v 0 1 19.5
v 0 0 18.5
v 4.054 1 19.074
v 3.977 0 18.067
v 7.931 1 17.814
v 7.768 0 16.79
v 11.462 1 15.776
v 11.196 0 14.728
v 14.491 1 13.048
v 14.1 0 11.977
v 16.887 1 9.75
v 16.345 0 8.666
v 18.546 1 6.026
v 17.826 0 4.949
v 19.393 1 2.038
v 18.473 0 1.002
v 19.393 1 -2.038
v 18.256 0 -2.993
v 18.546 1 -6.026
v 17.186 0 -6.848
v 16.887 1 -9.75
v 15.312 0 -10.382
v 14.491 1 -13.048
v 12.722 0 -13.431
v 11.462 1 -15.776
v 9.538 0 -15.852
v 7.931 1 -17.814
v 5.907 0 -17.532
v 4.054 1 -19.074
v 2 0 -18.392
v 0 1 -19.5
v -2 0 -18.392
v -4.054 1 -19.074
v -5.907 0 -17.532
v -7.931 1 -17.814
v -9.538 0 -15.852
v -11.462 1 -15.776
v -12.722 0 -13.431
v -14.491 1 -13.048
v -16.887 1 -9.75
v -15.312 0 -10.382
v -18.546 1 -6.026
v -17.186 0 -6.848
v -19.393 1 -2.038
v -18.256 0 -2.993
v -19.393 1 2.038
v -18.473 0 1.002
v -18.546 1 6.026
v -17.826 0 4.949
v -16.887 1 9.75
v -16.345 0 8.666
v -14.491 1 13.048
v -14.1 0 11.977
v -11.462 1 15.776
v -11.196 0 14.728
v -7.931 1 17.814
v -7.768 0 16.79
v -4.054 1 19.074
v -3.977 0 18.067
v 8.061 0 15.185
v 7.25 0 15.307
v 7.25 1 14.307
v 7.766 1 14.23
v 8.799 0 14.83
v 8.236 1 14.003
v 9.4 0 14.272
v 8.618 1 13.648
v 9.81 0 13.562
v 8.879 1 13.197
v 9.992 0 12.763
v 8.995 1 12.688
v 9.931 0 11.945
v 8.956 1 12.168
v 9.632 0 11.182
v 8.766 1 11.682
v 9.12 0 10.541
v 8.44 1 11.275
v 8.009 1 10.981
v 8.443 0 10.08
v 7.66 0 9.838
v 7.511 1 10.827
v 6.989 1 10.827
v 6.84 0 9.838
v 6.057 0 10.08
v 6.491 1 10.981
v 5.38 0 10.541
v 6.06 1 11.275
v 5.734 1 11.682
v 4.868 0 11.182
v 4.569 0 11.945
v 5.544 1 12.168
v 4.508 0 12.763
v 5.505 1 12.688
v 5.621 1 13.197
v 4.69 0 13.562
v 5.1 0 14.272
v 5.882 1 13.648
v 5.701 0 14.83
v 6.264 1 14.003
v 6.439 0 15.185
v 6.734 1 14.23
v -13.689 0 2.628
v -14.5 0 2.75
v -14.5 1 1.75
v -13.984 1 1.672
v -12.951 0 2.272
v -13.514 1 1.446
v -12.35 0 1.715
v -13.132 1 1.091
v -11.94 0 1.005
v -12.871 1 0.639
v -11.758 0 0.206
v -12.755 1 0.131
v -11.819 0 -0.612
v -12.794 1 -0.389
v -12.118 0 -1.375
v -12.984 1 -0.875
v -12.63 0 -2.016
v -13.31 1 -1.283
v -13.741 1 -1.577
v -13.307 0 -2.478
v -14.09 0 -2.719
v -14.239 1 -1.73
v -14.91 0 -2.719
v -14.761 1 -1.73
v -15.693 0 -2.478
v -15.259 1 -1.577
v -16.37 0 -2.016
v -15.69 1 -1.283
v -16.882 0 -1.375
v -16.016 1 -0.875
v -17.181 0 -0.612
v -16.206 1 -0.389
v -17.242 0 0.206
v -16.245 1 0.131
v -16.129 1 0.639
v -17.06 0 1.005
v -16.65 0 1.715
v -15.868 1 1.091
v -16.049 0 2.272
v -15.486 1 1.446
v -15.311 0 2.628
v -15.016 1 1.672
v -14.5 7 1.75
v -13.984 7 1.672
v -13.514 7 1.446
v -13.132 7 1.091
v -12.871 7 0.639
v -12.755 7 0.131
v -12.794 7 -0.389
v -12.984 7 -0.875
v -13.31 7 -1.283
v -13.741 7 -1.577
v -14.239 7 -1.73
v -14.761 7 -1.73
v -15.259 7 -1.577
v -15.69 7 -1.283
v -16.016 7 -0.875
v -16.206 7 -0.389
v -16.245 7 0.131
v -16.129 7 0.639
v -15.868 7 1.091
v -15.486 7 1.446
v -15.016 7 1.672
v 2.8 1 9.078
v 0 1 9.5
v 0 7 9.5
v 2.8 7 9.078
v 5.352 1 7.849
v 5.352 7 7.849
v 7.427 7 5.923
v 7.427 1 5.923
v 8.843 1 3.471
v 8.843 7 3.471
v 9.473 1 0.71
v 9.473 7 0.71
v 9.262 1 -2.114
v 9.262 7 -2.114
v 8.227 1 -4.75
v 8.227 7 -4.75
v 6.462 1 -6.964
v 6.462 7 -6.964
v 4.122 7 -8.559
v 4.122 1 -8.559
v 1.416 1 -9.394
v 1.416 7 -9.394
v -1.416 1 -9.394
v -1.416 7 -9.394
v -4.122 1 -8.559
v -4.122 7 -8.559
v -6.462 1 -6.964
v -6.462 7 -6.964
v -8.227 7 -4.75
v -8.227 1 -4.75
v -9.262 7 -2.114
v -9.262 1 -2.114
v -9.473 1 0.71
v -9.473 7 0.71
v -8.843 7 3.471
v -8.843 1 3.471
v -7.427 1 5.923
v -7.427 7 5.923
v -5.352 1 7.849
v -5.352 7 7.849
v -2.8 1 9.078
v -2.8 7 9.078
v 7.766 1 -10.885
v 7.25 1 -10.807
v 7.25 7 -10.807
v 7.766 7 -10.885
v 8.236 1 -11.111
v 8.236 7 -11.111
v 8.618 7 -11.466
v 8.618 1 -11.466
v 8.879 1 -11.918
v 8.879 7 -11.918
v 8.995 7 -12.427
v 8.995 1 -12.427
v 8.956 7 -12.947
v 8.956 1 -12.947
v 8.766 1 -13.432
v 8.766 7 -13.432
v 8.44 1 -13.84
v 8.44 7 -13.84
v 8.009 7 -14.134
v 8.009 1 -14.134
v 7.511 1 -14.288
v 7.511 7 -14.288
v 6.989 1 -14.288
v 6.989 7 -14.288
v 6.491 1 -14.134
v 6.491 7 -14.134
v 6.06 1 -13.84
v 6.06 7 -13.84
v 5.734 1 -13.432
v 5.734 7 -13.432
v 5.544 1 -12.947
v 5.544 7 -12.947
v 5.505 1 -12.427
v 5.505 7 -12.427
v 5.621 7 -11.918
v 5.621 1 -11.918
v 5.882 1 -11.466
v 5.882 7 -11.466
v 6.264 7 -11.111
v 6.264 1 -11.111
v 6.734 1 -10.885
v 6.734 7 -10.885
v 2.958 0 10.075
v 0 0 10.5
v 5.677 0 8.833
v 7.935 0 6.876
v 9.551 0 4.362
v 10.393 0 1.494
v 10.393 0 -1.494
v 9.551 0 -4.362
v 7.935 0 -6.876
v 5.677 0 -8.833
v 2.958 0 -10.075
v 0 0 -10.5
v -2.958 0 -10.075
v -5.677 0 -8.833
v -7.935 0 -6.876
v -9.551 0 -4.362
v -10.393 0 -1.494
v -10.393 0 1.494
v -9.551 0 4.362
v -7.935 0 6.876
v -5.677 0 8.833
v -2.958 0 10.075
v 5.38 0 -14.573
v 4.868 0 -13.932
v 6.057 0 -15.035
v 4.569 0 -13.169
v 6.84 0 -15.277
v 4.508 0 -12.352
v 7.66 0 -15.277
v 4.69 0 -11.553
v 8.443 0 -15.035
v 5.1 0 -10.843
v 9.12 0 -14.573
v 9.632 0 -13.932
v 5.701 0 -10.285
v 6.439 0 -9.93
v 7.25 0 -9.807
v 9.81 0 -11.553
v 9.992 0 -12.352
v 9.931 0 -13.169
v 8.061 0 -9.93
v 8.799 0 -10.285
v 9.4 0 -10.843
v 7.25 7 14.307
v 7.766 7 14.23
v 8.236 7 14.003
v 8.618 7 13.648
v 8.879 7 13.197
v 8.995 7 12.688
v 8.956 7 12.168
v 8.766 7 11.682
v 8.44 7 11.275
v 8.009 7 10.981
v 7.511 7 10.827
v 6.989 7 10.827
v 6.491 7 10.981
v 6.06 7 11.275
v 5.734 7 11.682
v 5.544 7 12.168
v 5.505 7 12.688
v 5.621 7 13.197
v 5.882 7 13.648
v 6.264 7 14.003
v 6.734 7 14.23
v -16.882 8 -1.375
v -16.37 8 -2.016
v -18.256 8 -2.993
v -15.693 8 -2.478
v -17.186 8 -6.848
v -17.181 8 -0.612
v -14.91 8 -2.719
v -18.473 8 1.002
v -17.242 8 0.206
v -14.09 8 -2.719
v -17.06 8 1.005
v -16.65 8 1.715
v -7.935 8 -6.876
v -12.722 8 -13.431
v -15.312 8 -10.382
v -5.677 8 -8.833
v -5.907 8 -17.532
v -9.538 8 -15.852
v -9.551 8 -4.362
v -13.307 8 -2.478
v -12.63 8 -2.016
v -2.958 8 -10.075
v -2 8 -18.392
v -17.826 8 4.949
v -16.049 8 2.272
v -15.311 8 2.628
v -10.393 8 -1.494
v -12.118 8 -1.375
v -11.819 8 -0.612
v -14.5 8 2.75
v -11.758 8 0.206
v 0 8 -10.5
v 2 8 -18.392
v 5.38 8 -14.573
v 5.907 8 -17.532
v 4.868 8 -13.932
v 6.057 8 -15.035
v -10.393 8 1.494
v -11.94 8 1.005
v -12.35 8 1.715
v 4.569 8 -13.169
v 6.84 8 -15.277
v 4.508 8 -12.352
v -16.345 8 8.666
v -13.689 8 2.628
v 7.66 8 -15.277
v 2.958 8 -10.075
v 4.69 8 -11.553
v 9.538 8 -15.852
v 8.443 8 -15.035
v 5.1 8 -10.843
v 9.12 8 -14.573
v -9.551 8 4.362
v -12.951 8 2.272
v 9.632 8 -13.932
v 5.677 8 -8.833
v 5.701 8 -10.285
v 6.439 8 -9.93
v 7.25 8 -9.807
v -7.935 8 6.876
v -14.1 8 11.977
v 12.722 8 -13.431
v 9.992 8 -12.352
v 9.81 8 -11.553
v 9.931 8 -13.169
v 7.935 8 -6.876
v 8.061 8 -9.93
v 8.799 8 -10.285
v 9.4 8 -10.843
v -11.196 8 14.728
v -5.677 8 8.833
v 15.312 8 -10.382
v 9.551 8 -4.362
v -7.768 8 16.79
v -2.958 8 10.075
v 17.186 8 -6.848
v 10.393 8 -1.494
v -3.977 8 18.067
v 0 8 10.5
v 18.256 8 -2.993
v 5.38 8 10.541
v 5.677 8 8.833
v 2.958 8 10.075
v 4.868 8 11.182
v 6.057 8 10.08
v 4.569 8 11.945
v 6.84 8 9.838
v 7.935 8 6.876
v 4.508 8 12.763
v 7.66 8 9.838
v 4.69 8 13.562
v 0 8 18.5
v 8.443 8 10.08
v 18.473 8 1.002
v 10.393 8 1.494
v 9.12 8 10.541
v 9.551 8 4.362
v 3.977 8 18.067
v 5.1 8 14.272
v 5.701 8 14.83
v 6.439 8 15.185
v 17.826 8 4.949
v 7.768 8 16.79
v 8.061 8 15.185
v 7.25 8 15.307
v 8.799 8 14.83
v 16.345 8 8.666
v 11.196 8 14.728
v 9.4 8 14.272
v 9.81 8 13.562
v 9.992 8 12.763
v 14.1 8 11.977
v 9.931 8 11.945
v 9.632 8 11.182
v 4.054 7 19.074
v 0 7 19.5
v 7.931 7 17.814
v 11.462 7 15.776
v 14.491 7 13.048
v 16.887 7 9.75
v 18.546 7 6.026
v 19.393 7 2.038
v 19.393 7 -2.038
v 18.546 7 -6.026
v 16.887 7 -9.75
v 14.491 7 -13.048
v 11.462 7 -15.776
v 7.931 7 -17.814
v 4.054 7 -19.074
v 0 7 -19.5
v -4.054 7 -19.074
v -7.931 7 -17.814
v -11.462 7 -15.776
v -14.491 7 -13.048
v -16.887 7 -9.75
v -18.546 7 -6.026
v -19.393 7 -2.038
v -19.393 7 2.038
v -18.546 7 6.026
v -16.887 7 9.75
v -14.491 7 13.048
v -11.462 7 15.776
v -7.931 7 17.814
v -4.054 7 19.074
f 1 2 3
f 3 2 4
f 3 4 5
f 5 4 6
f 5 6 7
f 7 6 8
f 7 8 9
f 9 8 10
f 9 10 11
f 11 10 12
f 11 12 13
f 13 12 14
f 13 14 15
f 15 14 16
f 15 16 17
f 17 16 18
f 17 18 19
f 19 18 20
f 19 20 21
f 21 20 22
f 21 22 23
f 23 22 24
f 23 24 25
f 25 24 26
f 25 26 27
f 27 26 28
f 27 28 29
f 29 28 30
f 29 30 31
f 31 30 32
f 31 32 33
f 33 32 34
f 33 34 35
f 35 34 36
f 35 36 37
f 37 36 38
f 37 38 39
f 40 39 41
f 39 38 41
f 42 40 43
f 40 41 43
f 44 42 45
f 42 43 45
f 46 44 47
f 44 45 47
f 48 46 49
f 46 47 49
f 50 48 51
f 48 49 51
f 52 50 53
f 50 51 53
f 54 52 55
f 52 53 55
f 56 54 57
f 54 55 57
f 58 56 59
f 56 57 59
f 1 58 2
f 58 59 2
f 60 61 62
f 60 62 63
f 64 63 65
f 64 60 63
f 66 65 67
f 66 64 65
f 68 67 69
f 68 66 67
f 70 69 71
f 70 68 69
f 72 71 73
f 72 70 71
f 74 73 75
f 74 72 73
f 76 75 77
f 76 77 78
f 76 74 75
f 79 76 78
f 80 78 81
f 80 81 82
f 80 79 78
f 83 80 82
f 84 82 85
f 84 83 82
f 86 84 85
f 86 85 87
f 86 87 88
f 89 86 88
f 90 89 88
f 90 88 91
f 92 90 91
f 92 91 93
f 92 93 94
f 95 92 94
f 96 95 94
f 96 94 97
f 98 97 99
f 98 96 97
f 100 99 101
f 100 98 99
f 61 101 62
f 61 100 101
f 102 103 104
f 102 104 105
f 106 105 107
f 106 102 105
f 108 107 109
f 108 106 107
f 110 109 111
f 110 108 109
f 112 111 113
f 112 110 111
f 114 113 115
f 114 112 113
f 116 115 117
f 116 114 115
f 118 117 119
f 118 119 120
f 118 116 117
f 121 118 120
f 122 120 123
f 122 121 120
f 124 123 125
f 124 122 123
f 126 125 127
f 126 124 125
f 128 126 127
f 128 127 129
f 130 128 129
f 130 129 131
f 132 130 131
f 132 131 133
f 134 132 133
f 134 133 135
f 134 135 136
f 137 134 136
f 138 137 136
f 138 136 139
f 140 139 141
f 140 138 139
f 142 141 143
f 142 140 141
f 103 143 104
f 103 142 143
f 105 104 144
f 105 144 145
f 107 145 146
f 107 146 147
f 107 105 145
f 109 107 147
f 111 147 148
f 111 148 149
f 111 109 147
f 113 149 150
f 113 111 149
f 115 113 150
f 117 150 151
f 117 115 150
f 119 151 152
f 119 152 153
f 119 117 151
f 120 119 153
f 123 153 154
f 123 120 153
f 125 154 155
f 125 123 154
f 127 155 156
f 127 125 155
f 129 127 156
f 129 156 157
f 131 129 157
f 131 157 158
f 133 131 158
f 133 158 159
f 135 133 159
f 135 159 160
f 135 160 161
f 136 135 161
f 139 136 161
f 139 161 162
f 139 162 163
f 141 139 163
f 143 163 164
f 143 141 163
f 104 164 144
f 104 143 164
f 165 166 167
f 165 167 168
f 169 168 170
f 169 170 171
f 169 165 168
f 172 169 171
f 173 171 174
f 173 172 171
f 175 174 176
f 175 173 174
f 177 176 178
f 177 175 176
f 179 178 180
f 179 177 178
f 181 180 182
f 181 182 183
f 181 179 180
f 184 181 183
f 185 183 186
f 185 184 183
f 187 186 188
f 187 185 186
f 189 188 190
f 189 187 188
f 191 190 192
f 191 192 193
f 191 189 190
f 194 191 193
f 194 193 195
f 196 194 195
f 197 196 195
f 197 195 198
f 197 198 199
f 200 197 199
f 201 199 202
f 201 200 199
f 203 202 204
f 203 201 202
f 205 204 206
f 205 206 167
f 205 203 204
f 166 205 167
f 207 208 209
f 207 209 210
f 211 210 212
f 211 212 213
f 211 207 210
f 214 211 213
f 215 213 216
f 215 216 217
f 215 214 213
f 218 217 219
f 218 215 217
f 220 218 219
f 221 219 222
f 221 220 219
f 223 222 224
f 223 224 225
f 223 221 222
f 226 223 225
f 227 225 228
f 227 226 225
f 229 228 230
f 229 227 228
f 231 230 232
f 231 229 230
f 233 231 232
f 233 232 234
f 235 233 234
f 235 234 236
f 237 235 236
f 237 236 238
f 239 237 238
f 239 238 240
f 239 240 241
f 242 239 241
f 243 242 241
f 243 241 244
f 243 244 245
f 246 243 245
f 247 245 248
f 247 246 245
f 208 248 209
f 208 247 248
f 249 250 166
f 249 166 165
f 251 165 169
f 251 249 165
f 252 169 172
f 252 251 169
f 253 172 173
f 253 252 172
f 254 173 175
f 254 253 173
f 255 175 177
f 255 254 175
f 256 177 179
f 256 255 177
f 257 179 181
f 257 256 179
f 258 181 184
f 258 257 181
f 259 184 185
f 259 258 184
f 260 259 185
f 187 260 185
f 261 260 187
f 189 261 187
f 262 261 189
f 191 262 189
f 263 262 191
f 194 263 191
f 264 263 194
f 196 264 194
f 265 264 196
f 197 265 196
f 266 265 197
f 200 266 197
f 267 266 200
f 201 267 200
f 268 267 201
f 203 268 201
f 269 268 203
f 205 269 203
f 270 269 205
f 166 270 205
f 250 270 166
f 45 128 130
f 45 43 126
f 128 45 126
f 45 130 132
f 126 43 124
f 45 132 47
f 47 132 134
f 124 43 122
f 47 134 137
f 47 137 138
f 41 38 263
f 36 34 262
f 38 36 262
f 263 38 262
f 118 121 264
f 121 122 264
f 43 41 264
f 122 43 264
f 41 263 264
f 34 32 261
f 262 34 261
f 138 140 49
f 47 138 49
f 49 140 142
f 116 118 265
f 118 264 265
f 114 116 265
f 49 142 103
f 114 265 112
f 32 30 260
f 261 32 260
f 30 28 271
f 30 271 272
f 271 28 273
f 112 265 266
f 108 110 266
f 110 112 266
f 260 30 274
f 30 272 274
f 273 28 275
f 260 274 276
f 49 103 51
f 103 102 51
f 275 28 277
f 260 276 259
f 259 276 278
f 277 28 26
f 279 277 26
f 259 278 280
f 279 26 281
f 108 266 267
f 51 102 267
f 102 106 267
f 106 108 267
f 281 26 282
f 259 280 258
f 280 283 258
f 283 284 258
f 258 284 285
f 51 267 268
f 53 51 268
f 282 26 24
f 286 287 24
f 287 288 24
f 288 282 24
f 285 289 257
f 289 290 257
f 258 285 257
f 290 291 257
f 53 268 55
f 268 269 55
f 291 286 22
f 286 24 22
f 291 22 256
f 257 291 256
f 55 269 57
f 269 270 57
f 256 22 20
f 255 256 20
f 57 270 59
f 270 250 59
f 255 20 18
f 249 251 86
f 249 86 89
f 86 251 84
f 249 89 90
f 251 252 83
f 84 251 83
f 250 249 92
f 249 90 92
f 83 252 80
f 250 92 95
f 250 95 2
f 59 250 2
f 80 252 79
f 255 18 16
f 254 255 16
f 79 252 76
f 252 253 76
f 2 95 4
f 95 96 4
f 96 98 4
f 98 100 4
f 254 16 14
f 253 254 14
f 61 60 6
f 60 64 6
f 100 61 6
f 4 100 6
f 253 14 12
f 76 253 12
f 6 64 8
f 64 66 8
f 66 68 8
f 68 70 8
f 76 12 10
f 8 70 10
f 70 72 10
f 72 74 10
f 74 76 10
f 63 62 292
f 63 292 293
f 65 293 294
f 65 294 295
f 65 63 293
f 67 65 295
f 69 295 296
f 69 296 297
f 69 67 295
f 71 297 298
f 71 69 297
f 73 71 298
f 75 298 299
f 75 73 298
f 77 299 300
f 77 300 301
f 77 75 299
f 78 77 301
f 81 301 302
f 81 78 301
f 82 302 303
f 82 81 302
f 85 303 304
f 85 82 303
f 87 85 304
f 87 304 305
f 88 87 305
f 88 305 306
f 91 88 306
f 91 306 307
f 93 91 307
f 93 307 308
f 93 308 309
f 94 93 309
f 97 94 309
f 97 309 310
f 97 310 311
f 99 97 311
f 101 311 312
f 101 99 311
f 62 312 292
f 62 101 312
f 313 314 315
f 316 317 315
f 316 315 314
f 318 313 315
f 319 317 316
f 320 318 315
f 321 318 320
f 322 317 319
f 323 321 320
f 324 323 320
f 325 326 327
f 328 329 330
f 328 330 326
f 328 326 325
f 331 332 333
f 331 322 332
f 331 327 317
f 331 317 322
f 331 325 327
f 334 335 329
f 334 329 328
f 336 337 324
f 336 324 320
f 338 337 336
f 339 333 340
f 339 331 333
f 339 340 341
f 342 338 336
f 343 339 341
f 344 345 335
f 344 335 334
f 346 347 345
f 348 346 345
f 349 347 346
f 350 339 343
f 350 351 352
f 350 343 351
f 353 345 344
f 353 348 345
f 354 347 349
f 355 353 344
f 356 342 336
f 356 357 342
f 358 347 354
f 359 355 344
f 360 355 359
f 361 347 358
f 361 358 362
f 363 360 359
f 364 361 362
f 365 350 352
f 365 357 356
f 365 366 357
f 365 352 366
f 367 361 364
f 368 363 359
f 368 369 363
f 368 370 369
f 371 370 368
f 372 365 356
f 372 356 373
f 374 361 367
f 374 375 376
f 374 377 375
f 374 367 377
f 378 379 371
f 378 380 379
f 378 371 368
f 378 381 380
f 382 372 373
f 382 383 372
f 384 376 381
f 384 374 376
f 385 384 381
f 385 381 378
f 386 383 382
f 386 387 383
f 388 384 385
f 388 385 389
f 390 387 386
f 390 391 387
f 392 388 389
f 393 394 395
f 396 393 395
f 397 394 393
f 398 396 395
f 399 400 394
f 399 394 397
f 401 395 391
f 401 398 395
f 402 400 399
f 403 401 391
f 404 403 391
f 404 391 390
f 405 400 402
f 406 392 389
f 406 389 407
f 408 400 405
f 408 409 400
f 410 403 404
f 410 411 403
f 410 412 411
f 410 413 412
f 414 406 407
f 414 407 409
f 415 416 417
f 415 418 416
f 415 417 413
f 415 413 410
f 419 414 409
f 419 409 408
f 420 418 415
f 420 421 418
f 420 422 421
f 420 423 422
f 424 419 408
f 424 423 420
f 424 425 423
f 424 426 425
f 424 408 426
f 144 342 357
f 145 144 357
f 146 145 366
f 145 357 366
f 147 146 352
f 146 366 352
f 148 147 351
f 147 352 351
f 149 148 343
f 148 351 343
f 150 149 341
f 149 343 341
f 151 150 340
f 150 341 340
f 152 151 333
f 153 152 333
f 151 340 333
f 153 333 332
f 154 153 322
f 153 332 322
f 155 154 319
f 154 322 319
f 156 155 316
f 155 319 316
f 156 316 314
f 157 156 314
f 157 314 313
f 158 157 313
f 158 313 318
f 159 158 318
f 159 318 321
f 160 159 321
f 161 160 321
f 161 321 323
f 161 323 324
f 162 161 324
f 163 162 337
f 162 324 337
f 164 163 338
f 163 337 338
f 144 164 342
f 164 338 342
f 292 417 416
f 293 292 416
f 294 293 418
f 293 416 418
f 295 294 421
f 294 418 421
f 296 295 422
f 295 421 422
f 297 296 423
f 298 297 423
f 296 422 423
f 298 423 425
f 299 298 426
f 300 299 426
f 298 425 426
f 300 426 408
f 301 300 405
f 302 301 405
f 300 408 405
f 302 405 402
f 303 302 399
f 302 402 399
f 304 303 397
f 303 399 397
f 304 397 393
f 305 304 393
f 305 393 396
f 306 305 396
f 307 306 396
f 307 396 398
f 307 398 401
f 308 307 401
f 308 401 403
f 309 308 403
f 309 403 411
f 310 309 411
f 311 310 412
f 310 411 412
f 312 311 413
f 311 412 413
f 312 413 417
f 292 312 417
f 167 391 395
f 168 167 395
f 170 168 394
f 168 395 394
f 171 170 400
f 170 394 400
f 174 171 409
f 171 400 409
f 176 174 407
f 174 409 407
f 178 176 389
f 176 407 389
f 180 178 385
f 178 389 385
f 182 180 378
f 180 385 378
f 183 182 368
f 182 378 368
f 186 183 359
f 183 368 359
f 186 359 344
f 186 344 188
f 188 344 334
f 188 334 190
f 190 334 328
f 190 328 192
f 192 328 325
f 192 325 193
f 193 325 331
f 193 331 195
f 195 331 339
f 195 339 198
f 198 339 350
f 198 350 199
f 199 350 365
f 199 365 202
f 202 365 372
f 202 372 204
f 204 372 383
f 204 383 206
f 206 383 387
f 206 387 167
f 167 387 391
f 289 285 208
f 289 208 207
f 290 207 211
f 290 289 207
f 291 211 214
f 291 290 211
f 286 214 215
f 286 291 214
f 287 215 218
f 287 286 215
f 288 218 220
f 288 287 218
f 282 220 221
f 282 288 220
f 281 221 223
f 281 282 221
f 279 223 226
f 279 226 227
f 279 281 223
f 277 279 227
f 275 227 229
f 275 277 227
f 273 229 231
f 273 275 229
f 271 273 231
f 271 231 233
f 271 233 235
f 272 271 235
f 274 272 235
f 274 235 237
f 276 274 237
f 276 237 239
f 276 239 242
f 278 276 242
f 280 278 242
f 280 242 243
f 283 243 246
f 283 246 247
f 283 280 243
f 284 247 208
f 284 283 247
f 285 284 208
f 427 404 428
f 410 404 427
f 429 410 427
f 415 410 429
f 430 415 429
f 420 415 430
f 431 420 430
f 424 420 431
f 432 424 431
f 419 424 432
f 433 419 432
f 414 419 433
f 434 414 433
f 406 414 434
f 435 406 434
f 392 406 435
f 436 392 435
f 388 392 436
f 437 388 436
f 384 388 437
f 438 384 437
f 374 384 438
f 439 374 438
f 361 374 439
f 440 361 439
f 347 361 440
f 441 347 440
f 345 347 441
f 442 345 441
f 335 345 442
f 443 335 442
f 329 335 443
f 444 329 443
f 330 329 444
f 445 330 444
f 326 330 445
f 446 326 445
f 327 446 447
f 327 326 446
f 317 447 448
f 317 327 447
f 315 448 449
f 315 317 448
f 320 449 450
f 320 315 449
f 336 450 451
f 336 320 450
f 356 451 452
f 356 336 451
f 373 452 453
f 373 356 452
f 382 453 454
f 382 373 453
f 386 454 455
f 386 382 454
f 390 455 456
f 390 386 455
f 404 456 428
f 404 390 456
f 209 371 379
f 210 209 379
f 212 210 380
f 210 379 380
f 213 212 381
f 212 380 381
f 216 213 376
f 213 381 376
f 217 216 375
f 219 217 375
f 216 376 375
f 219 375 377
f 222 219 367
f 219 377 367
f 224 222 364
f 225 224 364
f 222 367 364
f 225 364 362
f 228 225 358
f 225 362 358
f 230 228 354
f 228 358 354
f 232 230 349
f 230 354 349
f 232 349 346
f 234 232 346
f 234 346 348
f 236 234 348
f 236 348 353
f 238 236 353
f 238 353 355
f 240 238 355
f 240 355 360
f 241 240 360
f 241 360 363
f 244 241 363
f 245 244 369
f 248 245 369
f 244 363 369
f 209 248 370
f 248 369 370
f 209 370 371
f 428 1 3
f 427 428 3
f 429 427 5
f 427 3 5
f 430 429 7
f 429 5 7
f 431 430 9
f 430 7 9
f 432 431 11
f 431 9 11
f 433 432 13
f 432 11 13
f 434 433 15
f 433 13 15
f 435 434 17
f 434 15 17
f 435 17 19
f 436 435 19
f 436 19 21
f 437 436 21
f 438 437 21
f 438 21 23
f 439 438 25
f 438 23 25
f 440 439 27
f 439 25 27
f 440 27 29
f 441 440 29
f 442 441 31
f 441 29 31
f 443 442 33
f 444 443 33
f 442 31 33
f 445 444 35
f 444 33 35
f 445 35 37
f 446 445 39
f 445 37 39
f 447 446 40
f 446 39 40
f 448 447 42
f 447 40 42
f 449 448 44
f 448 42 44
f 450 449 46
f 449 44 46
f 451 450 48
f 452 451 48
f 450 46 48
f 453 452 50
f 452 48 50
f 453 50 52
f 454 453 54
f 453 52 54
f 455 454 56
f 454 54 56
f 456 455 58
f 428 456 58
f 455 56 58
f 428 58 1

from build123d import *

# Parameters (mm, degrees)
SKETCH1_R           = 19.5
SKETCH1_R_2         = 9.5
SKETCH1_R_3         = 1.75
BOSS_EXTRUDE1_DEPTH = 8
CHAMFER1_SIZE       = 1


with BuildPart() as part:
    # Sketch1 → Boss-Extrude1 (new body)
    with BuildSketch(Plane(origin=(0, 0, 0), x_dir=(1, 0, 0), z_dir=(0, 1, 0))):
        with Locations(Location((0, 0, 0), (0, 0, 270))):
            Circle(SKETCH1_R)
        with Locations(Location((0, 0, 0), (0, 0, 270))):
            Circle(SKETCH1_R_2, mode=Mode.SUBTRACT)
        with Locations(Location((-14.5, 0, 0), (0, 0, 270))):
            Circle(SKETCH1_R_3, mode=Mode.SUBTRACT)
        with Locations(Location((7.25, 12.557368355, 0), (0, 0, 270))):
            Circle(SKETCH1_R_3, mode=Mode.SUBTRACT)
        with Locations(Location((7.25, -12.557368355, 0), (0, 0, 270))):
            Circle(SKETCH1_R_3, mode=Mode.SUBTRACT)
    extrude(amount=BOSS_EXTRUDE1_DEPTH)

    # Chamfer1
    chamfer1_edges = [part.edges().sort_by_distance(p)[0] for p in [
        (7.25, 0, -14.307368355),
        (7.25, 8, -14.307368355),
        (7.25, 0, 10.807368355),
        (7.25, 8, 10.807368355),
        (0, 0, -19.5),
        (0, 8, -19.5),
        (0, 0, -9.5),
        (0, 8, -9.5),
        (-14.5, 0, -1.75),
        (-14.5, 8, -1.75),
    ]]
    chamfer(chamfer1_edges, length=CHAMFER1_SIZE)


solid = part.part
